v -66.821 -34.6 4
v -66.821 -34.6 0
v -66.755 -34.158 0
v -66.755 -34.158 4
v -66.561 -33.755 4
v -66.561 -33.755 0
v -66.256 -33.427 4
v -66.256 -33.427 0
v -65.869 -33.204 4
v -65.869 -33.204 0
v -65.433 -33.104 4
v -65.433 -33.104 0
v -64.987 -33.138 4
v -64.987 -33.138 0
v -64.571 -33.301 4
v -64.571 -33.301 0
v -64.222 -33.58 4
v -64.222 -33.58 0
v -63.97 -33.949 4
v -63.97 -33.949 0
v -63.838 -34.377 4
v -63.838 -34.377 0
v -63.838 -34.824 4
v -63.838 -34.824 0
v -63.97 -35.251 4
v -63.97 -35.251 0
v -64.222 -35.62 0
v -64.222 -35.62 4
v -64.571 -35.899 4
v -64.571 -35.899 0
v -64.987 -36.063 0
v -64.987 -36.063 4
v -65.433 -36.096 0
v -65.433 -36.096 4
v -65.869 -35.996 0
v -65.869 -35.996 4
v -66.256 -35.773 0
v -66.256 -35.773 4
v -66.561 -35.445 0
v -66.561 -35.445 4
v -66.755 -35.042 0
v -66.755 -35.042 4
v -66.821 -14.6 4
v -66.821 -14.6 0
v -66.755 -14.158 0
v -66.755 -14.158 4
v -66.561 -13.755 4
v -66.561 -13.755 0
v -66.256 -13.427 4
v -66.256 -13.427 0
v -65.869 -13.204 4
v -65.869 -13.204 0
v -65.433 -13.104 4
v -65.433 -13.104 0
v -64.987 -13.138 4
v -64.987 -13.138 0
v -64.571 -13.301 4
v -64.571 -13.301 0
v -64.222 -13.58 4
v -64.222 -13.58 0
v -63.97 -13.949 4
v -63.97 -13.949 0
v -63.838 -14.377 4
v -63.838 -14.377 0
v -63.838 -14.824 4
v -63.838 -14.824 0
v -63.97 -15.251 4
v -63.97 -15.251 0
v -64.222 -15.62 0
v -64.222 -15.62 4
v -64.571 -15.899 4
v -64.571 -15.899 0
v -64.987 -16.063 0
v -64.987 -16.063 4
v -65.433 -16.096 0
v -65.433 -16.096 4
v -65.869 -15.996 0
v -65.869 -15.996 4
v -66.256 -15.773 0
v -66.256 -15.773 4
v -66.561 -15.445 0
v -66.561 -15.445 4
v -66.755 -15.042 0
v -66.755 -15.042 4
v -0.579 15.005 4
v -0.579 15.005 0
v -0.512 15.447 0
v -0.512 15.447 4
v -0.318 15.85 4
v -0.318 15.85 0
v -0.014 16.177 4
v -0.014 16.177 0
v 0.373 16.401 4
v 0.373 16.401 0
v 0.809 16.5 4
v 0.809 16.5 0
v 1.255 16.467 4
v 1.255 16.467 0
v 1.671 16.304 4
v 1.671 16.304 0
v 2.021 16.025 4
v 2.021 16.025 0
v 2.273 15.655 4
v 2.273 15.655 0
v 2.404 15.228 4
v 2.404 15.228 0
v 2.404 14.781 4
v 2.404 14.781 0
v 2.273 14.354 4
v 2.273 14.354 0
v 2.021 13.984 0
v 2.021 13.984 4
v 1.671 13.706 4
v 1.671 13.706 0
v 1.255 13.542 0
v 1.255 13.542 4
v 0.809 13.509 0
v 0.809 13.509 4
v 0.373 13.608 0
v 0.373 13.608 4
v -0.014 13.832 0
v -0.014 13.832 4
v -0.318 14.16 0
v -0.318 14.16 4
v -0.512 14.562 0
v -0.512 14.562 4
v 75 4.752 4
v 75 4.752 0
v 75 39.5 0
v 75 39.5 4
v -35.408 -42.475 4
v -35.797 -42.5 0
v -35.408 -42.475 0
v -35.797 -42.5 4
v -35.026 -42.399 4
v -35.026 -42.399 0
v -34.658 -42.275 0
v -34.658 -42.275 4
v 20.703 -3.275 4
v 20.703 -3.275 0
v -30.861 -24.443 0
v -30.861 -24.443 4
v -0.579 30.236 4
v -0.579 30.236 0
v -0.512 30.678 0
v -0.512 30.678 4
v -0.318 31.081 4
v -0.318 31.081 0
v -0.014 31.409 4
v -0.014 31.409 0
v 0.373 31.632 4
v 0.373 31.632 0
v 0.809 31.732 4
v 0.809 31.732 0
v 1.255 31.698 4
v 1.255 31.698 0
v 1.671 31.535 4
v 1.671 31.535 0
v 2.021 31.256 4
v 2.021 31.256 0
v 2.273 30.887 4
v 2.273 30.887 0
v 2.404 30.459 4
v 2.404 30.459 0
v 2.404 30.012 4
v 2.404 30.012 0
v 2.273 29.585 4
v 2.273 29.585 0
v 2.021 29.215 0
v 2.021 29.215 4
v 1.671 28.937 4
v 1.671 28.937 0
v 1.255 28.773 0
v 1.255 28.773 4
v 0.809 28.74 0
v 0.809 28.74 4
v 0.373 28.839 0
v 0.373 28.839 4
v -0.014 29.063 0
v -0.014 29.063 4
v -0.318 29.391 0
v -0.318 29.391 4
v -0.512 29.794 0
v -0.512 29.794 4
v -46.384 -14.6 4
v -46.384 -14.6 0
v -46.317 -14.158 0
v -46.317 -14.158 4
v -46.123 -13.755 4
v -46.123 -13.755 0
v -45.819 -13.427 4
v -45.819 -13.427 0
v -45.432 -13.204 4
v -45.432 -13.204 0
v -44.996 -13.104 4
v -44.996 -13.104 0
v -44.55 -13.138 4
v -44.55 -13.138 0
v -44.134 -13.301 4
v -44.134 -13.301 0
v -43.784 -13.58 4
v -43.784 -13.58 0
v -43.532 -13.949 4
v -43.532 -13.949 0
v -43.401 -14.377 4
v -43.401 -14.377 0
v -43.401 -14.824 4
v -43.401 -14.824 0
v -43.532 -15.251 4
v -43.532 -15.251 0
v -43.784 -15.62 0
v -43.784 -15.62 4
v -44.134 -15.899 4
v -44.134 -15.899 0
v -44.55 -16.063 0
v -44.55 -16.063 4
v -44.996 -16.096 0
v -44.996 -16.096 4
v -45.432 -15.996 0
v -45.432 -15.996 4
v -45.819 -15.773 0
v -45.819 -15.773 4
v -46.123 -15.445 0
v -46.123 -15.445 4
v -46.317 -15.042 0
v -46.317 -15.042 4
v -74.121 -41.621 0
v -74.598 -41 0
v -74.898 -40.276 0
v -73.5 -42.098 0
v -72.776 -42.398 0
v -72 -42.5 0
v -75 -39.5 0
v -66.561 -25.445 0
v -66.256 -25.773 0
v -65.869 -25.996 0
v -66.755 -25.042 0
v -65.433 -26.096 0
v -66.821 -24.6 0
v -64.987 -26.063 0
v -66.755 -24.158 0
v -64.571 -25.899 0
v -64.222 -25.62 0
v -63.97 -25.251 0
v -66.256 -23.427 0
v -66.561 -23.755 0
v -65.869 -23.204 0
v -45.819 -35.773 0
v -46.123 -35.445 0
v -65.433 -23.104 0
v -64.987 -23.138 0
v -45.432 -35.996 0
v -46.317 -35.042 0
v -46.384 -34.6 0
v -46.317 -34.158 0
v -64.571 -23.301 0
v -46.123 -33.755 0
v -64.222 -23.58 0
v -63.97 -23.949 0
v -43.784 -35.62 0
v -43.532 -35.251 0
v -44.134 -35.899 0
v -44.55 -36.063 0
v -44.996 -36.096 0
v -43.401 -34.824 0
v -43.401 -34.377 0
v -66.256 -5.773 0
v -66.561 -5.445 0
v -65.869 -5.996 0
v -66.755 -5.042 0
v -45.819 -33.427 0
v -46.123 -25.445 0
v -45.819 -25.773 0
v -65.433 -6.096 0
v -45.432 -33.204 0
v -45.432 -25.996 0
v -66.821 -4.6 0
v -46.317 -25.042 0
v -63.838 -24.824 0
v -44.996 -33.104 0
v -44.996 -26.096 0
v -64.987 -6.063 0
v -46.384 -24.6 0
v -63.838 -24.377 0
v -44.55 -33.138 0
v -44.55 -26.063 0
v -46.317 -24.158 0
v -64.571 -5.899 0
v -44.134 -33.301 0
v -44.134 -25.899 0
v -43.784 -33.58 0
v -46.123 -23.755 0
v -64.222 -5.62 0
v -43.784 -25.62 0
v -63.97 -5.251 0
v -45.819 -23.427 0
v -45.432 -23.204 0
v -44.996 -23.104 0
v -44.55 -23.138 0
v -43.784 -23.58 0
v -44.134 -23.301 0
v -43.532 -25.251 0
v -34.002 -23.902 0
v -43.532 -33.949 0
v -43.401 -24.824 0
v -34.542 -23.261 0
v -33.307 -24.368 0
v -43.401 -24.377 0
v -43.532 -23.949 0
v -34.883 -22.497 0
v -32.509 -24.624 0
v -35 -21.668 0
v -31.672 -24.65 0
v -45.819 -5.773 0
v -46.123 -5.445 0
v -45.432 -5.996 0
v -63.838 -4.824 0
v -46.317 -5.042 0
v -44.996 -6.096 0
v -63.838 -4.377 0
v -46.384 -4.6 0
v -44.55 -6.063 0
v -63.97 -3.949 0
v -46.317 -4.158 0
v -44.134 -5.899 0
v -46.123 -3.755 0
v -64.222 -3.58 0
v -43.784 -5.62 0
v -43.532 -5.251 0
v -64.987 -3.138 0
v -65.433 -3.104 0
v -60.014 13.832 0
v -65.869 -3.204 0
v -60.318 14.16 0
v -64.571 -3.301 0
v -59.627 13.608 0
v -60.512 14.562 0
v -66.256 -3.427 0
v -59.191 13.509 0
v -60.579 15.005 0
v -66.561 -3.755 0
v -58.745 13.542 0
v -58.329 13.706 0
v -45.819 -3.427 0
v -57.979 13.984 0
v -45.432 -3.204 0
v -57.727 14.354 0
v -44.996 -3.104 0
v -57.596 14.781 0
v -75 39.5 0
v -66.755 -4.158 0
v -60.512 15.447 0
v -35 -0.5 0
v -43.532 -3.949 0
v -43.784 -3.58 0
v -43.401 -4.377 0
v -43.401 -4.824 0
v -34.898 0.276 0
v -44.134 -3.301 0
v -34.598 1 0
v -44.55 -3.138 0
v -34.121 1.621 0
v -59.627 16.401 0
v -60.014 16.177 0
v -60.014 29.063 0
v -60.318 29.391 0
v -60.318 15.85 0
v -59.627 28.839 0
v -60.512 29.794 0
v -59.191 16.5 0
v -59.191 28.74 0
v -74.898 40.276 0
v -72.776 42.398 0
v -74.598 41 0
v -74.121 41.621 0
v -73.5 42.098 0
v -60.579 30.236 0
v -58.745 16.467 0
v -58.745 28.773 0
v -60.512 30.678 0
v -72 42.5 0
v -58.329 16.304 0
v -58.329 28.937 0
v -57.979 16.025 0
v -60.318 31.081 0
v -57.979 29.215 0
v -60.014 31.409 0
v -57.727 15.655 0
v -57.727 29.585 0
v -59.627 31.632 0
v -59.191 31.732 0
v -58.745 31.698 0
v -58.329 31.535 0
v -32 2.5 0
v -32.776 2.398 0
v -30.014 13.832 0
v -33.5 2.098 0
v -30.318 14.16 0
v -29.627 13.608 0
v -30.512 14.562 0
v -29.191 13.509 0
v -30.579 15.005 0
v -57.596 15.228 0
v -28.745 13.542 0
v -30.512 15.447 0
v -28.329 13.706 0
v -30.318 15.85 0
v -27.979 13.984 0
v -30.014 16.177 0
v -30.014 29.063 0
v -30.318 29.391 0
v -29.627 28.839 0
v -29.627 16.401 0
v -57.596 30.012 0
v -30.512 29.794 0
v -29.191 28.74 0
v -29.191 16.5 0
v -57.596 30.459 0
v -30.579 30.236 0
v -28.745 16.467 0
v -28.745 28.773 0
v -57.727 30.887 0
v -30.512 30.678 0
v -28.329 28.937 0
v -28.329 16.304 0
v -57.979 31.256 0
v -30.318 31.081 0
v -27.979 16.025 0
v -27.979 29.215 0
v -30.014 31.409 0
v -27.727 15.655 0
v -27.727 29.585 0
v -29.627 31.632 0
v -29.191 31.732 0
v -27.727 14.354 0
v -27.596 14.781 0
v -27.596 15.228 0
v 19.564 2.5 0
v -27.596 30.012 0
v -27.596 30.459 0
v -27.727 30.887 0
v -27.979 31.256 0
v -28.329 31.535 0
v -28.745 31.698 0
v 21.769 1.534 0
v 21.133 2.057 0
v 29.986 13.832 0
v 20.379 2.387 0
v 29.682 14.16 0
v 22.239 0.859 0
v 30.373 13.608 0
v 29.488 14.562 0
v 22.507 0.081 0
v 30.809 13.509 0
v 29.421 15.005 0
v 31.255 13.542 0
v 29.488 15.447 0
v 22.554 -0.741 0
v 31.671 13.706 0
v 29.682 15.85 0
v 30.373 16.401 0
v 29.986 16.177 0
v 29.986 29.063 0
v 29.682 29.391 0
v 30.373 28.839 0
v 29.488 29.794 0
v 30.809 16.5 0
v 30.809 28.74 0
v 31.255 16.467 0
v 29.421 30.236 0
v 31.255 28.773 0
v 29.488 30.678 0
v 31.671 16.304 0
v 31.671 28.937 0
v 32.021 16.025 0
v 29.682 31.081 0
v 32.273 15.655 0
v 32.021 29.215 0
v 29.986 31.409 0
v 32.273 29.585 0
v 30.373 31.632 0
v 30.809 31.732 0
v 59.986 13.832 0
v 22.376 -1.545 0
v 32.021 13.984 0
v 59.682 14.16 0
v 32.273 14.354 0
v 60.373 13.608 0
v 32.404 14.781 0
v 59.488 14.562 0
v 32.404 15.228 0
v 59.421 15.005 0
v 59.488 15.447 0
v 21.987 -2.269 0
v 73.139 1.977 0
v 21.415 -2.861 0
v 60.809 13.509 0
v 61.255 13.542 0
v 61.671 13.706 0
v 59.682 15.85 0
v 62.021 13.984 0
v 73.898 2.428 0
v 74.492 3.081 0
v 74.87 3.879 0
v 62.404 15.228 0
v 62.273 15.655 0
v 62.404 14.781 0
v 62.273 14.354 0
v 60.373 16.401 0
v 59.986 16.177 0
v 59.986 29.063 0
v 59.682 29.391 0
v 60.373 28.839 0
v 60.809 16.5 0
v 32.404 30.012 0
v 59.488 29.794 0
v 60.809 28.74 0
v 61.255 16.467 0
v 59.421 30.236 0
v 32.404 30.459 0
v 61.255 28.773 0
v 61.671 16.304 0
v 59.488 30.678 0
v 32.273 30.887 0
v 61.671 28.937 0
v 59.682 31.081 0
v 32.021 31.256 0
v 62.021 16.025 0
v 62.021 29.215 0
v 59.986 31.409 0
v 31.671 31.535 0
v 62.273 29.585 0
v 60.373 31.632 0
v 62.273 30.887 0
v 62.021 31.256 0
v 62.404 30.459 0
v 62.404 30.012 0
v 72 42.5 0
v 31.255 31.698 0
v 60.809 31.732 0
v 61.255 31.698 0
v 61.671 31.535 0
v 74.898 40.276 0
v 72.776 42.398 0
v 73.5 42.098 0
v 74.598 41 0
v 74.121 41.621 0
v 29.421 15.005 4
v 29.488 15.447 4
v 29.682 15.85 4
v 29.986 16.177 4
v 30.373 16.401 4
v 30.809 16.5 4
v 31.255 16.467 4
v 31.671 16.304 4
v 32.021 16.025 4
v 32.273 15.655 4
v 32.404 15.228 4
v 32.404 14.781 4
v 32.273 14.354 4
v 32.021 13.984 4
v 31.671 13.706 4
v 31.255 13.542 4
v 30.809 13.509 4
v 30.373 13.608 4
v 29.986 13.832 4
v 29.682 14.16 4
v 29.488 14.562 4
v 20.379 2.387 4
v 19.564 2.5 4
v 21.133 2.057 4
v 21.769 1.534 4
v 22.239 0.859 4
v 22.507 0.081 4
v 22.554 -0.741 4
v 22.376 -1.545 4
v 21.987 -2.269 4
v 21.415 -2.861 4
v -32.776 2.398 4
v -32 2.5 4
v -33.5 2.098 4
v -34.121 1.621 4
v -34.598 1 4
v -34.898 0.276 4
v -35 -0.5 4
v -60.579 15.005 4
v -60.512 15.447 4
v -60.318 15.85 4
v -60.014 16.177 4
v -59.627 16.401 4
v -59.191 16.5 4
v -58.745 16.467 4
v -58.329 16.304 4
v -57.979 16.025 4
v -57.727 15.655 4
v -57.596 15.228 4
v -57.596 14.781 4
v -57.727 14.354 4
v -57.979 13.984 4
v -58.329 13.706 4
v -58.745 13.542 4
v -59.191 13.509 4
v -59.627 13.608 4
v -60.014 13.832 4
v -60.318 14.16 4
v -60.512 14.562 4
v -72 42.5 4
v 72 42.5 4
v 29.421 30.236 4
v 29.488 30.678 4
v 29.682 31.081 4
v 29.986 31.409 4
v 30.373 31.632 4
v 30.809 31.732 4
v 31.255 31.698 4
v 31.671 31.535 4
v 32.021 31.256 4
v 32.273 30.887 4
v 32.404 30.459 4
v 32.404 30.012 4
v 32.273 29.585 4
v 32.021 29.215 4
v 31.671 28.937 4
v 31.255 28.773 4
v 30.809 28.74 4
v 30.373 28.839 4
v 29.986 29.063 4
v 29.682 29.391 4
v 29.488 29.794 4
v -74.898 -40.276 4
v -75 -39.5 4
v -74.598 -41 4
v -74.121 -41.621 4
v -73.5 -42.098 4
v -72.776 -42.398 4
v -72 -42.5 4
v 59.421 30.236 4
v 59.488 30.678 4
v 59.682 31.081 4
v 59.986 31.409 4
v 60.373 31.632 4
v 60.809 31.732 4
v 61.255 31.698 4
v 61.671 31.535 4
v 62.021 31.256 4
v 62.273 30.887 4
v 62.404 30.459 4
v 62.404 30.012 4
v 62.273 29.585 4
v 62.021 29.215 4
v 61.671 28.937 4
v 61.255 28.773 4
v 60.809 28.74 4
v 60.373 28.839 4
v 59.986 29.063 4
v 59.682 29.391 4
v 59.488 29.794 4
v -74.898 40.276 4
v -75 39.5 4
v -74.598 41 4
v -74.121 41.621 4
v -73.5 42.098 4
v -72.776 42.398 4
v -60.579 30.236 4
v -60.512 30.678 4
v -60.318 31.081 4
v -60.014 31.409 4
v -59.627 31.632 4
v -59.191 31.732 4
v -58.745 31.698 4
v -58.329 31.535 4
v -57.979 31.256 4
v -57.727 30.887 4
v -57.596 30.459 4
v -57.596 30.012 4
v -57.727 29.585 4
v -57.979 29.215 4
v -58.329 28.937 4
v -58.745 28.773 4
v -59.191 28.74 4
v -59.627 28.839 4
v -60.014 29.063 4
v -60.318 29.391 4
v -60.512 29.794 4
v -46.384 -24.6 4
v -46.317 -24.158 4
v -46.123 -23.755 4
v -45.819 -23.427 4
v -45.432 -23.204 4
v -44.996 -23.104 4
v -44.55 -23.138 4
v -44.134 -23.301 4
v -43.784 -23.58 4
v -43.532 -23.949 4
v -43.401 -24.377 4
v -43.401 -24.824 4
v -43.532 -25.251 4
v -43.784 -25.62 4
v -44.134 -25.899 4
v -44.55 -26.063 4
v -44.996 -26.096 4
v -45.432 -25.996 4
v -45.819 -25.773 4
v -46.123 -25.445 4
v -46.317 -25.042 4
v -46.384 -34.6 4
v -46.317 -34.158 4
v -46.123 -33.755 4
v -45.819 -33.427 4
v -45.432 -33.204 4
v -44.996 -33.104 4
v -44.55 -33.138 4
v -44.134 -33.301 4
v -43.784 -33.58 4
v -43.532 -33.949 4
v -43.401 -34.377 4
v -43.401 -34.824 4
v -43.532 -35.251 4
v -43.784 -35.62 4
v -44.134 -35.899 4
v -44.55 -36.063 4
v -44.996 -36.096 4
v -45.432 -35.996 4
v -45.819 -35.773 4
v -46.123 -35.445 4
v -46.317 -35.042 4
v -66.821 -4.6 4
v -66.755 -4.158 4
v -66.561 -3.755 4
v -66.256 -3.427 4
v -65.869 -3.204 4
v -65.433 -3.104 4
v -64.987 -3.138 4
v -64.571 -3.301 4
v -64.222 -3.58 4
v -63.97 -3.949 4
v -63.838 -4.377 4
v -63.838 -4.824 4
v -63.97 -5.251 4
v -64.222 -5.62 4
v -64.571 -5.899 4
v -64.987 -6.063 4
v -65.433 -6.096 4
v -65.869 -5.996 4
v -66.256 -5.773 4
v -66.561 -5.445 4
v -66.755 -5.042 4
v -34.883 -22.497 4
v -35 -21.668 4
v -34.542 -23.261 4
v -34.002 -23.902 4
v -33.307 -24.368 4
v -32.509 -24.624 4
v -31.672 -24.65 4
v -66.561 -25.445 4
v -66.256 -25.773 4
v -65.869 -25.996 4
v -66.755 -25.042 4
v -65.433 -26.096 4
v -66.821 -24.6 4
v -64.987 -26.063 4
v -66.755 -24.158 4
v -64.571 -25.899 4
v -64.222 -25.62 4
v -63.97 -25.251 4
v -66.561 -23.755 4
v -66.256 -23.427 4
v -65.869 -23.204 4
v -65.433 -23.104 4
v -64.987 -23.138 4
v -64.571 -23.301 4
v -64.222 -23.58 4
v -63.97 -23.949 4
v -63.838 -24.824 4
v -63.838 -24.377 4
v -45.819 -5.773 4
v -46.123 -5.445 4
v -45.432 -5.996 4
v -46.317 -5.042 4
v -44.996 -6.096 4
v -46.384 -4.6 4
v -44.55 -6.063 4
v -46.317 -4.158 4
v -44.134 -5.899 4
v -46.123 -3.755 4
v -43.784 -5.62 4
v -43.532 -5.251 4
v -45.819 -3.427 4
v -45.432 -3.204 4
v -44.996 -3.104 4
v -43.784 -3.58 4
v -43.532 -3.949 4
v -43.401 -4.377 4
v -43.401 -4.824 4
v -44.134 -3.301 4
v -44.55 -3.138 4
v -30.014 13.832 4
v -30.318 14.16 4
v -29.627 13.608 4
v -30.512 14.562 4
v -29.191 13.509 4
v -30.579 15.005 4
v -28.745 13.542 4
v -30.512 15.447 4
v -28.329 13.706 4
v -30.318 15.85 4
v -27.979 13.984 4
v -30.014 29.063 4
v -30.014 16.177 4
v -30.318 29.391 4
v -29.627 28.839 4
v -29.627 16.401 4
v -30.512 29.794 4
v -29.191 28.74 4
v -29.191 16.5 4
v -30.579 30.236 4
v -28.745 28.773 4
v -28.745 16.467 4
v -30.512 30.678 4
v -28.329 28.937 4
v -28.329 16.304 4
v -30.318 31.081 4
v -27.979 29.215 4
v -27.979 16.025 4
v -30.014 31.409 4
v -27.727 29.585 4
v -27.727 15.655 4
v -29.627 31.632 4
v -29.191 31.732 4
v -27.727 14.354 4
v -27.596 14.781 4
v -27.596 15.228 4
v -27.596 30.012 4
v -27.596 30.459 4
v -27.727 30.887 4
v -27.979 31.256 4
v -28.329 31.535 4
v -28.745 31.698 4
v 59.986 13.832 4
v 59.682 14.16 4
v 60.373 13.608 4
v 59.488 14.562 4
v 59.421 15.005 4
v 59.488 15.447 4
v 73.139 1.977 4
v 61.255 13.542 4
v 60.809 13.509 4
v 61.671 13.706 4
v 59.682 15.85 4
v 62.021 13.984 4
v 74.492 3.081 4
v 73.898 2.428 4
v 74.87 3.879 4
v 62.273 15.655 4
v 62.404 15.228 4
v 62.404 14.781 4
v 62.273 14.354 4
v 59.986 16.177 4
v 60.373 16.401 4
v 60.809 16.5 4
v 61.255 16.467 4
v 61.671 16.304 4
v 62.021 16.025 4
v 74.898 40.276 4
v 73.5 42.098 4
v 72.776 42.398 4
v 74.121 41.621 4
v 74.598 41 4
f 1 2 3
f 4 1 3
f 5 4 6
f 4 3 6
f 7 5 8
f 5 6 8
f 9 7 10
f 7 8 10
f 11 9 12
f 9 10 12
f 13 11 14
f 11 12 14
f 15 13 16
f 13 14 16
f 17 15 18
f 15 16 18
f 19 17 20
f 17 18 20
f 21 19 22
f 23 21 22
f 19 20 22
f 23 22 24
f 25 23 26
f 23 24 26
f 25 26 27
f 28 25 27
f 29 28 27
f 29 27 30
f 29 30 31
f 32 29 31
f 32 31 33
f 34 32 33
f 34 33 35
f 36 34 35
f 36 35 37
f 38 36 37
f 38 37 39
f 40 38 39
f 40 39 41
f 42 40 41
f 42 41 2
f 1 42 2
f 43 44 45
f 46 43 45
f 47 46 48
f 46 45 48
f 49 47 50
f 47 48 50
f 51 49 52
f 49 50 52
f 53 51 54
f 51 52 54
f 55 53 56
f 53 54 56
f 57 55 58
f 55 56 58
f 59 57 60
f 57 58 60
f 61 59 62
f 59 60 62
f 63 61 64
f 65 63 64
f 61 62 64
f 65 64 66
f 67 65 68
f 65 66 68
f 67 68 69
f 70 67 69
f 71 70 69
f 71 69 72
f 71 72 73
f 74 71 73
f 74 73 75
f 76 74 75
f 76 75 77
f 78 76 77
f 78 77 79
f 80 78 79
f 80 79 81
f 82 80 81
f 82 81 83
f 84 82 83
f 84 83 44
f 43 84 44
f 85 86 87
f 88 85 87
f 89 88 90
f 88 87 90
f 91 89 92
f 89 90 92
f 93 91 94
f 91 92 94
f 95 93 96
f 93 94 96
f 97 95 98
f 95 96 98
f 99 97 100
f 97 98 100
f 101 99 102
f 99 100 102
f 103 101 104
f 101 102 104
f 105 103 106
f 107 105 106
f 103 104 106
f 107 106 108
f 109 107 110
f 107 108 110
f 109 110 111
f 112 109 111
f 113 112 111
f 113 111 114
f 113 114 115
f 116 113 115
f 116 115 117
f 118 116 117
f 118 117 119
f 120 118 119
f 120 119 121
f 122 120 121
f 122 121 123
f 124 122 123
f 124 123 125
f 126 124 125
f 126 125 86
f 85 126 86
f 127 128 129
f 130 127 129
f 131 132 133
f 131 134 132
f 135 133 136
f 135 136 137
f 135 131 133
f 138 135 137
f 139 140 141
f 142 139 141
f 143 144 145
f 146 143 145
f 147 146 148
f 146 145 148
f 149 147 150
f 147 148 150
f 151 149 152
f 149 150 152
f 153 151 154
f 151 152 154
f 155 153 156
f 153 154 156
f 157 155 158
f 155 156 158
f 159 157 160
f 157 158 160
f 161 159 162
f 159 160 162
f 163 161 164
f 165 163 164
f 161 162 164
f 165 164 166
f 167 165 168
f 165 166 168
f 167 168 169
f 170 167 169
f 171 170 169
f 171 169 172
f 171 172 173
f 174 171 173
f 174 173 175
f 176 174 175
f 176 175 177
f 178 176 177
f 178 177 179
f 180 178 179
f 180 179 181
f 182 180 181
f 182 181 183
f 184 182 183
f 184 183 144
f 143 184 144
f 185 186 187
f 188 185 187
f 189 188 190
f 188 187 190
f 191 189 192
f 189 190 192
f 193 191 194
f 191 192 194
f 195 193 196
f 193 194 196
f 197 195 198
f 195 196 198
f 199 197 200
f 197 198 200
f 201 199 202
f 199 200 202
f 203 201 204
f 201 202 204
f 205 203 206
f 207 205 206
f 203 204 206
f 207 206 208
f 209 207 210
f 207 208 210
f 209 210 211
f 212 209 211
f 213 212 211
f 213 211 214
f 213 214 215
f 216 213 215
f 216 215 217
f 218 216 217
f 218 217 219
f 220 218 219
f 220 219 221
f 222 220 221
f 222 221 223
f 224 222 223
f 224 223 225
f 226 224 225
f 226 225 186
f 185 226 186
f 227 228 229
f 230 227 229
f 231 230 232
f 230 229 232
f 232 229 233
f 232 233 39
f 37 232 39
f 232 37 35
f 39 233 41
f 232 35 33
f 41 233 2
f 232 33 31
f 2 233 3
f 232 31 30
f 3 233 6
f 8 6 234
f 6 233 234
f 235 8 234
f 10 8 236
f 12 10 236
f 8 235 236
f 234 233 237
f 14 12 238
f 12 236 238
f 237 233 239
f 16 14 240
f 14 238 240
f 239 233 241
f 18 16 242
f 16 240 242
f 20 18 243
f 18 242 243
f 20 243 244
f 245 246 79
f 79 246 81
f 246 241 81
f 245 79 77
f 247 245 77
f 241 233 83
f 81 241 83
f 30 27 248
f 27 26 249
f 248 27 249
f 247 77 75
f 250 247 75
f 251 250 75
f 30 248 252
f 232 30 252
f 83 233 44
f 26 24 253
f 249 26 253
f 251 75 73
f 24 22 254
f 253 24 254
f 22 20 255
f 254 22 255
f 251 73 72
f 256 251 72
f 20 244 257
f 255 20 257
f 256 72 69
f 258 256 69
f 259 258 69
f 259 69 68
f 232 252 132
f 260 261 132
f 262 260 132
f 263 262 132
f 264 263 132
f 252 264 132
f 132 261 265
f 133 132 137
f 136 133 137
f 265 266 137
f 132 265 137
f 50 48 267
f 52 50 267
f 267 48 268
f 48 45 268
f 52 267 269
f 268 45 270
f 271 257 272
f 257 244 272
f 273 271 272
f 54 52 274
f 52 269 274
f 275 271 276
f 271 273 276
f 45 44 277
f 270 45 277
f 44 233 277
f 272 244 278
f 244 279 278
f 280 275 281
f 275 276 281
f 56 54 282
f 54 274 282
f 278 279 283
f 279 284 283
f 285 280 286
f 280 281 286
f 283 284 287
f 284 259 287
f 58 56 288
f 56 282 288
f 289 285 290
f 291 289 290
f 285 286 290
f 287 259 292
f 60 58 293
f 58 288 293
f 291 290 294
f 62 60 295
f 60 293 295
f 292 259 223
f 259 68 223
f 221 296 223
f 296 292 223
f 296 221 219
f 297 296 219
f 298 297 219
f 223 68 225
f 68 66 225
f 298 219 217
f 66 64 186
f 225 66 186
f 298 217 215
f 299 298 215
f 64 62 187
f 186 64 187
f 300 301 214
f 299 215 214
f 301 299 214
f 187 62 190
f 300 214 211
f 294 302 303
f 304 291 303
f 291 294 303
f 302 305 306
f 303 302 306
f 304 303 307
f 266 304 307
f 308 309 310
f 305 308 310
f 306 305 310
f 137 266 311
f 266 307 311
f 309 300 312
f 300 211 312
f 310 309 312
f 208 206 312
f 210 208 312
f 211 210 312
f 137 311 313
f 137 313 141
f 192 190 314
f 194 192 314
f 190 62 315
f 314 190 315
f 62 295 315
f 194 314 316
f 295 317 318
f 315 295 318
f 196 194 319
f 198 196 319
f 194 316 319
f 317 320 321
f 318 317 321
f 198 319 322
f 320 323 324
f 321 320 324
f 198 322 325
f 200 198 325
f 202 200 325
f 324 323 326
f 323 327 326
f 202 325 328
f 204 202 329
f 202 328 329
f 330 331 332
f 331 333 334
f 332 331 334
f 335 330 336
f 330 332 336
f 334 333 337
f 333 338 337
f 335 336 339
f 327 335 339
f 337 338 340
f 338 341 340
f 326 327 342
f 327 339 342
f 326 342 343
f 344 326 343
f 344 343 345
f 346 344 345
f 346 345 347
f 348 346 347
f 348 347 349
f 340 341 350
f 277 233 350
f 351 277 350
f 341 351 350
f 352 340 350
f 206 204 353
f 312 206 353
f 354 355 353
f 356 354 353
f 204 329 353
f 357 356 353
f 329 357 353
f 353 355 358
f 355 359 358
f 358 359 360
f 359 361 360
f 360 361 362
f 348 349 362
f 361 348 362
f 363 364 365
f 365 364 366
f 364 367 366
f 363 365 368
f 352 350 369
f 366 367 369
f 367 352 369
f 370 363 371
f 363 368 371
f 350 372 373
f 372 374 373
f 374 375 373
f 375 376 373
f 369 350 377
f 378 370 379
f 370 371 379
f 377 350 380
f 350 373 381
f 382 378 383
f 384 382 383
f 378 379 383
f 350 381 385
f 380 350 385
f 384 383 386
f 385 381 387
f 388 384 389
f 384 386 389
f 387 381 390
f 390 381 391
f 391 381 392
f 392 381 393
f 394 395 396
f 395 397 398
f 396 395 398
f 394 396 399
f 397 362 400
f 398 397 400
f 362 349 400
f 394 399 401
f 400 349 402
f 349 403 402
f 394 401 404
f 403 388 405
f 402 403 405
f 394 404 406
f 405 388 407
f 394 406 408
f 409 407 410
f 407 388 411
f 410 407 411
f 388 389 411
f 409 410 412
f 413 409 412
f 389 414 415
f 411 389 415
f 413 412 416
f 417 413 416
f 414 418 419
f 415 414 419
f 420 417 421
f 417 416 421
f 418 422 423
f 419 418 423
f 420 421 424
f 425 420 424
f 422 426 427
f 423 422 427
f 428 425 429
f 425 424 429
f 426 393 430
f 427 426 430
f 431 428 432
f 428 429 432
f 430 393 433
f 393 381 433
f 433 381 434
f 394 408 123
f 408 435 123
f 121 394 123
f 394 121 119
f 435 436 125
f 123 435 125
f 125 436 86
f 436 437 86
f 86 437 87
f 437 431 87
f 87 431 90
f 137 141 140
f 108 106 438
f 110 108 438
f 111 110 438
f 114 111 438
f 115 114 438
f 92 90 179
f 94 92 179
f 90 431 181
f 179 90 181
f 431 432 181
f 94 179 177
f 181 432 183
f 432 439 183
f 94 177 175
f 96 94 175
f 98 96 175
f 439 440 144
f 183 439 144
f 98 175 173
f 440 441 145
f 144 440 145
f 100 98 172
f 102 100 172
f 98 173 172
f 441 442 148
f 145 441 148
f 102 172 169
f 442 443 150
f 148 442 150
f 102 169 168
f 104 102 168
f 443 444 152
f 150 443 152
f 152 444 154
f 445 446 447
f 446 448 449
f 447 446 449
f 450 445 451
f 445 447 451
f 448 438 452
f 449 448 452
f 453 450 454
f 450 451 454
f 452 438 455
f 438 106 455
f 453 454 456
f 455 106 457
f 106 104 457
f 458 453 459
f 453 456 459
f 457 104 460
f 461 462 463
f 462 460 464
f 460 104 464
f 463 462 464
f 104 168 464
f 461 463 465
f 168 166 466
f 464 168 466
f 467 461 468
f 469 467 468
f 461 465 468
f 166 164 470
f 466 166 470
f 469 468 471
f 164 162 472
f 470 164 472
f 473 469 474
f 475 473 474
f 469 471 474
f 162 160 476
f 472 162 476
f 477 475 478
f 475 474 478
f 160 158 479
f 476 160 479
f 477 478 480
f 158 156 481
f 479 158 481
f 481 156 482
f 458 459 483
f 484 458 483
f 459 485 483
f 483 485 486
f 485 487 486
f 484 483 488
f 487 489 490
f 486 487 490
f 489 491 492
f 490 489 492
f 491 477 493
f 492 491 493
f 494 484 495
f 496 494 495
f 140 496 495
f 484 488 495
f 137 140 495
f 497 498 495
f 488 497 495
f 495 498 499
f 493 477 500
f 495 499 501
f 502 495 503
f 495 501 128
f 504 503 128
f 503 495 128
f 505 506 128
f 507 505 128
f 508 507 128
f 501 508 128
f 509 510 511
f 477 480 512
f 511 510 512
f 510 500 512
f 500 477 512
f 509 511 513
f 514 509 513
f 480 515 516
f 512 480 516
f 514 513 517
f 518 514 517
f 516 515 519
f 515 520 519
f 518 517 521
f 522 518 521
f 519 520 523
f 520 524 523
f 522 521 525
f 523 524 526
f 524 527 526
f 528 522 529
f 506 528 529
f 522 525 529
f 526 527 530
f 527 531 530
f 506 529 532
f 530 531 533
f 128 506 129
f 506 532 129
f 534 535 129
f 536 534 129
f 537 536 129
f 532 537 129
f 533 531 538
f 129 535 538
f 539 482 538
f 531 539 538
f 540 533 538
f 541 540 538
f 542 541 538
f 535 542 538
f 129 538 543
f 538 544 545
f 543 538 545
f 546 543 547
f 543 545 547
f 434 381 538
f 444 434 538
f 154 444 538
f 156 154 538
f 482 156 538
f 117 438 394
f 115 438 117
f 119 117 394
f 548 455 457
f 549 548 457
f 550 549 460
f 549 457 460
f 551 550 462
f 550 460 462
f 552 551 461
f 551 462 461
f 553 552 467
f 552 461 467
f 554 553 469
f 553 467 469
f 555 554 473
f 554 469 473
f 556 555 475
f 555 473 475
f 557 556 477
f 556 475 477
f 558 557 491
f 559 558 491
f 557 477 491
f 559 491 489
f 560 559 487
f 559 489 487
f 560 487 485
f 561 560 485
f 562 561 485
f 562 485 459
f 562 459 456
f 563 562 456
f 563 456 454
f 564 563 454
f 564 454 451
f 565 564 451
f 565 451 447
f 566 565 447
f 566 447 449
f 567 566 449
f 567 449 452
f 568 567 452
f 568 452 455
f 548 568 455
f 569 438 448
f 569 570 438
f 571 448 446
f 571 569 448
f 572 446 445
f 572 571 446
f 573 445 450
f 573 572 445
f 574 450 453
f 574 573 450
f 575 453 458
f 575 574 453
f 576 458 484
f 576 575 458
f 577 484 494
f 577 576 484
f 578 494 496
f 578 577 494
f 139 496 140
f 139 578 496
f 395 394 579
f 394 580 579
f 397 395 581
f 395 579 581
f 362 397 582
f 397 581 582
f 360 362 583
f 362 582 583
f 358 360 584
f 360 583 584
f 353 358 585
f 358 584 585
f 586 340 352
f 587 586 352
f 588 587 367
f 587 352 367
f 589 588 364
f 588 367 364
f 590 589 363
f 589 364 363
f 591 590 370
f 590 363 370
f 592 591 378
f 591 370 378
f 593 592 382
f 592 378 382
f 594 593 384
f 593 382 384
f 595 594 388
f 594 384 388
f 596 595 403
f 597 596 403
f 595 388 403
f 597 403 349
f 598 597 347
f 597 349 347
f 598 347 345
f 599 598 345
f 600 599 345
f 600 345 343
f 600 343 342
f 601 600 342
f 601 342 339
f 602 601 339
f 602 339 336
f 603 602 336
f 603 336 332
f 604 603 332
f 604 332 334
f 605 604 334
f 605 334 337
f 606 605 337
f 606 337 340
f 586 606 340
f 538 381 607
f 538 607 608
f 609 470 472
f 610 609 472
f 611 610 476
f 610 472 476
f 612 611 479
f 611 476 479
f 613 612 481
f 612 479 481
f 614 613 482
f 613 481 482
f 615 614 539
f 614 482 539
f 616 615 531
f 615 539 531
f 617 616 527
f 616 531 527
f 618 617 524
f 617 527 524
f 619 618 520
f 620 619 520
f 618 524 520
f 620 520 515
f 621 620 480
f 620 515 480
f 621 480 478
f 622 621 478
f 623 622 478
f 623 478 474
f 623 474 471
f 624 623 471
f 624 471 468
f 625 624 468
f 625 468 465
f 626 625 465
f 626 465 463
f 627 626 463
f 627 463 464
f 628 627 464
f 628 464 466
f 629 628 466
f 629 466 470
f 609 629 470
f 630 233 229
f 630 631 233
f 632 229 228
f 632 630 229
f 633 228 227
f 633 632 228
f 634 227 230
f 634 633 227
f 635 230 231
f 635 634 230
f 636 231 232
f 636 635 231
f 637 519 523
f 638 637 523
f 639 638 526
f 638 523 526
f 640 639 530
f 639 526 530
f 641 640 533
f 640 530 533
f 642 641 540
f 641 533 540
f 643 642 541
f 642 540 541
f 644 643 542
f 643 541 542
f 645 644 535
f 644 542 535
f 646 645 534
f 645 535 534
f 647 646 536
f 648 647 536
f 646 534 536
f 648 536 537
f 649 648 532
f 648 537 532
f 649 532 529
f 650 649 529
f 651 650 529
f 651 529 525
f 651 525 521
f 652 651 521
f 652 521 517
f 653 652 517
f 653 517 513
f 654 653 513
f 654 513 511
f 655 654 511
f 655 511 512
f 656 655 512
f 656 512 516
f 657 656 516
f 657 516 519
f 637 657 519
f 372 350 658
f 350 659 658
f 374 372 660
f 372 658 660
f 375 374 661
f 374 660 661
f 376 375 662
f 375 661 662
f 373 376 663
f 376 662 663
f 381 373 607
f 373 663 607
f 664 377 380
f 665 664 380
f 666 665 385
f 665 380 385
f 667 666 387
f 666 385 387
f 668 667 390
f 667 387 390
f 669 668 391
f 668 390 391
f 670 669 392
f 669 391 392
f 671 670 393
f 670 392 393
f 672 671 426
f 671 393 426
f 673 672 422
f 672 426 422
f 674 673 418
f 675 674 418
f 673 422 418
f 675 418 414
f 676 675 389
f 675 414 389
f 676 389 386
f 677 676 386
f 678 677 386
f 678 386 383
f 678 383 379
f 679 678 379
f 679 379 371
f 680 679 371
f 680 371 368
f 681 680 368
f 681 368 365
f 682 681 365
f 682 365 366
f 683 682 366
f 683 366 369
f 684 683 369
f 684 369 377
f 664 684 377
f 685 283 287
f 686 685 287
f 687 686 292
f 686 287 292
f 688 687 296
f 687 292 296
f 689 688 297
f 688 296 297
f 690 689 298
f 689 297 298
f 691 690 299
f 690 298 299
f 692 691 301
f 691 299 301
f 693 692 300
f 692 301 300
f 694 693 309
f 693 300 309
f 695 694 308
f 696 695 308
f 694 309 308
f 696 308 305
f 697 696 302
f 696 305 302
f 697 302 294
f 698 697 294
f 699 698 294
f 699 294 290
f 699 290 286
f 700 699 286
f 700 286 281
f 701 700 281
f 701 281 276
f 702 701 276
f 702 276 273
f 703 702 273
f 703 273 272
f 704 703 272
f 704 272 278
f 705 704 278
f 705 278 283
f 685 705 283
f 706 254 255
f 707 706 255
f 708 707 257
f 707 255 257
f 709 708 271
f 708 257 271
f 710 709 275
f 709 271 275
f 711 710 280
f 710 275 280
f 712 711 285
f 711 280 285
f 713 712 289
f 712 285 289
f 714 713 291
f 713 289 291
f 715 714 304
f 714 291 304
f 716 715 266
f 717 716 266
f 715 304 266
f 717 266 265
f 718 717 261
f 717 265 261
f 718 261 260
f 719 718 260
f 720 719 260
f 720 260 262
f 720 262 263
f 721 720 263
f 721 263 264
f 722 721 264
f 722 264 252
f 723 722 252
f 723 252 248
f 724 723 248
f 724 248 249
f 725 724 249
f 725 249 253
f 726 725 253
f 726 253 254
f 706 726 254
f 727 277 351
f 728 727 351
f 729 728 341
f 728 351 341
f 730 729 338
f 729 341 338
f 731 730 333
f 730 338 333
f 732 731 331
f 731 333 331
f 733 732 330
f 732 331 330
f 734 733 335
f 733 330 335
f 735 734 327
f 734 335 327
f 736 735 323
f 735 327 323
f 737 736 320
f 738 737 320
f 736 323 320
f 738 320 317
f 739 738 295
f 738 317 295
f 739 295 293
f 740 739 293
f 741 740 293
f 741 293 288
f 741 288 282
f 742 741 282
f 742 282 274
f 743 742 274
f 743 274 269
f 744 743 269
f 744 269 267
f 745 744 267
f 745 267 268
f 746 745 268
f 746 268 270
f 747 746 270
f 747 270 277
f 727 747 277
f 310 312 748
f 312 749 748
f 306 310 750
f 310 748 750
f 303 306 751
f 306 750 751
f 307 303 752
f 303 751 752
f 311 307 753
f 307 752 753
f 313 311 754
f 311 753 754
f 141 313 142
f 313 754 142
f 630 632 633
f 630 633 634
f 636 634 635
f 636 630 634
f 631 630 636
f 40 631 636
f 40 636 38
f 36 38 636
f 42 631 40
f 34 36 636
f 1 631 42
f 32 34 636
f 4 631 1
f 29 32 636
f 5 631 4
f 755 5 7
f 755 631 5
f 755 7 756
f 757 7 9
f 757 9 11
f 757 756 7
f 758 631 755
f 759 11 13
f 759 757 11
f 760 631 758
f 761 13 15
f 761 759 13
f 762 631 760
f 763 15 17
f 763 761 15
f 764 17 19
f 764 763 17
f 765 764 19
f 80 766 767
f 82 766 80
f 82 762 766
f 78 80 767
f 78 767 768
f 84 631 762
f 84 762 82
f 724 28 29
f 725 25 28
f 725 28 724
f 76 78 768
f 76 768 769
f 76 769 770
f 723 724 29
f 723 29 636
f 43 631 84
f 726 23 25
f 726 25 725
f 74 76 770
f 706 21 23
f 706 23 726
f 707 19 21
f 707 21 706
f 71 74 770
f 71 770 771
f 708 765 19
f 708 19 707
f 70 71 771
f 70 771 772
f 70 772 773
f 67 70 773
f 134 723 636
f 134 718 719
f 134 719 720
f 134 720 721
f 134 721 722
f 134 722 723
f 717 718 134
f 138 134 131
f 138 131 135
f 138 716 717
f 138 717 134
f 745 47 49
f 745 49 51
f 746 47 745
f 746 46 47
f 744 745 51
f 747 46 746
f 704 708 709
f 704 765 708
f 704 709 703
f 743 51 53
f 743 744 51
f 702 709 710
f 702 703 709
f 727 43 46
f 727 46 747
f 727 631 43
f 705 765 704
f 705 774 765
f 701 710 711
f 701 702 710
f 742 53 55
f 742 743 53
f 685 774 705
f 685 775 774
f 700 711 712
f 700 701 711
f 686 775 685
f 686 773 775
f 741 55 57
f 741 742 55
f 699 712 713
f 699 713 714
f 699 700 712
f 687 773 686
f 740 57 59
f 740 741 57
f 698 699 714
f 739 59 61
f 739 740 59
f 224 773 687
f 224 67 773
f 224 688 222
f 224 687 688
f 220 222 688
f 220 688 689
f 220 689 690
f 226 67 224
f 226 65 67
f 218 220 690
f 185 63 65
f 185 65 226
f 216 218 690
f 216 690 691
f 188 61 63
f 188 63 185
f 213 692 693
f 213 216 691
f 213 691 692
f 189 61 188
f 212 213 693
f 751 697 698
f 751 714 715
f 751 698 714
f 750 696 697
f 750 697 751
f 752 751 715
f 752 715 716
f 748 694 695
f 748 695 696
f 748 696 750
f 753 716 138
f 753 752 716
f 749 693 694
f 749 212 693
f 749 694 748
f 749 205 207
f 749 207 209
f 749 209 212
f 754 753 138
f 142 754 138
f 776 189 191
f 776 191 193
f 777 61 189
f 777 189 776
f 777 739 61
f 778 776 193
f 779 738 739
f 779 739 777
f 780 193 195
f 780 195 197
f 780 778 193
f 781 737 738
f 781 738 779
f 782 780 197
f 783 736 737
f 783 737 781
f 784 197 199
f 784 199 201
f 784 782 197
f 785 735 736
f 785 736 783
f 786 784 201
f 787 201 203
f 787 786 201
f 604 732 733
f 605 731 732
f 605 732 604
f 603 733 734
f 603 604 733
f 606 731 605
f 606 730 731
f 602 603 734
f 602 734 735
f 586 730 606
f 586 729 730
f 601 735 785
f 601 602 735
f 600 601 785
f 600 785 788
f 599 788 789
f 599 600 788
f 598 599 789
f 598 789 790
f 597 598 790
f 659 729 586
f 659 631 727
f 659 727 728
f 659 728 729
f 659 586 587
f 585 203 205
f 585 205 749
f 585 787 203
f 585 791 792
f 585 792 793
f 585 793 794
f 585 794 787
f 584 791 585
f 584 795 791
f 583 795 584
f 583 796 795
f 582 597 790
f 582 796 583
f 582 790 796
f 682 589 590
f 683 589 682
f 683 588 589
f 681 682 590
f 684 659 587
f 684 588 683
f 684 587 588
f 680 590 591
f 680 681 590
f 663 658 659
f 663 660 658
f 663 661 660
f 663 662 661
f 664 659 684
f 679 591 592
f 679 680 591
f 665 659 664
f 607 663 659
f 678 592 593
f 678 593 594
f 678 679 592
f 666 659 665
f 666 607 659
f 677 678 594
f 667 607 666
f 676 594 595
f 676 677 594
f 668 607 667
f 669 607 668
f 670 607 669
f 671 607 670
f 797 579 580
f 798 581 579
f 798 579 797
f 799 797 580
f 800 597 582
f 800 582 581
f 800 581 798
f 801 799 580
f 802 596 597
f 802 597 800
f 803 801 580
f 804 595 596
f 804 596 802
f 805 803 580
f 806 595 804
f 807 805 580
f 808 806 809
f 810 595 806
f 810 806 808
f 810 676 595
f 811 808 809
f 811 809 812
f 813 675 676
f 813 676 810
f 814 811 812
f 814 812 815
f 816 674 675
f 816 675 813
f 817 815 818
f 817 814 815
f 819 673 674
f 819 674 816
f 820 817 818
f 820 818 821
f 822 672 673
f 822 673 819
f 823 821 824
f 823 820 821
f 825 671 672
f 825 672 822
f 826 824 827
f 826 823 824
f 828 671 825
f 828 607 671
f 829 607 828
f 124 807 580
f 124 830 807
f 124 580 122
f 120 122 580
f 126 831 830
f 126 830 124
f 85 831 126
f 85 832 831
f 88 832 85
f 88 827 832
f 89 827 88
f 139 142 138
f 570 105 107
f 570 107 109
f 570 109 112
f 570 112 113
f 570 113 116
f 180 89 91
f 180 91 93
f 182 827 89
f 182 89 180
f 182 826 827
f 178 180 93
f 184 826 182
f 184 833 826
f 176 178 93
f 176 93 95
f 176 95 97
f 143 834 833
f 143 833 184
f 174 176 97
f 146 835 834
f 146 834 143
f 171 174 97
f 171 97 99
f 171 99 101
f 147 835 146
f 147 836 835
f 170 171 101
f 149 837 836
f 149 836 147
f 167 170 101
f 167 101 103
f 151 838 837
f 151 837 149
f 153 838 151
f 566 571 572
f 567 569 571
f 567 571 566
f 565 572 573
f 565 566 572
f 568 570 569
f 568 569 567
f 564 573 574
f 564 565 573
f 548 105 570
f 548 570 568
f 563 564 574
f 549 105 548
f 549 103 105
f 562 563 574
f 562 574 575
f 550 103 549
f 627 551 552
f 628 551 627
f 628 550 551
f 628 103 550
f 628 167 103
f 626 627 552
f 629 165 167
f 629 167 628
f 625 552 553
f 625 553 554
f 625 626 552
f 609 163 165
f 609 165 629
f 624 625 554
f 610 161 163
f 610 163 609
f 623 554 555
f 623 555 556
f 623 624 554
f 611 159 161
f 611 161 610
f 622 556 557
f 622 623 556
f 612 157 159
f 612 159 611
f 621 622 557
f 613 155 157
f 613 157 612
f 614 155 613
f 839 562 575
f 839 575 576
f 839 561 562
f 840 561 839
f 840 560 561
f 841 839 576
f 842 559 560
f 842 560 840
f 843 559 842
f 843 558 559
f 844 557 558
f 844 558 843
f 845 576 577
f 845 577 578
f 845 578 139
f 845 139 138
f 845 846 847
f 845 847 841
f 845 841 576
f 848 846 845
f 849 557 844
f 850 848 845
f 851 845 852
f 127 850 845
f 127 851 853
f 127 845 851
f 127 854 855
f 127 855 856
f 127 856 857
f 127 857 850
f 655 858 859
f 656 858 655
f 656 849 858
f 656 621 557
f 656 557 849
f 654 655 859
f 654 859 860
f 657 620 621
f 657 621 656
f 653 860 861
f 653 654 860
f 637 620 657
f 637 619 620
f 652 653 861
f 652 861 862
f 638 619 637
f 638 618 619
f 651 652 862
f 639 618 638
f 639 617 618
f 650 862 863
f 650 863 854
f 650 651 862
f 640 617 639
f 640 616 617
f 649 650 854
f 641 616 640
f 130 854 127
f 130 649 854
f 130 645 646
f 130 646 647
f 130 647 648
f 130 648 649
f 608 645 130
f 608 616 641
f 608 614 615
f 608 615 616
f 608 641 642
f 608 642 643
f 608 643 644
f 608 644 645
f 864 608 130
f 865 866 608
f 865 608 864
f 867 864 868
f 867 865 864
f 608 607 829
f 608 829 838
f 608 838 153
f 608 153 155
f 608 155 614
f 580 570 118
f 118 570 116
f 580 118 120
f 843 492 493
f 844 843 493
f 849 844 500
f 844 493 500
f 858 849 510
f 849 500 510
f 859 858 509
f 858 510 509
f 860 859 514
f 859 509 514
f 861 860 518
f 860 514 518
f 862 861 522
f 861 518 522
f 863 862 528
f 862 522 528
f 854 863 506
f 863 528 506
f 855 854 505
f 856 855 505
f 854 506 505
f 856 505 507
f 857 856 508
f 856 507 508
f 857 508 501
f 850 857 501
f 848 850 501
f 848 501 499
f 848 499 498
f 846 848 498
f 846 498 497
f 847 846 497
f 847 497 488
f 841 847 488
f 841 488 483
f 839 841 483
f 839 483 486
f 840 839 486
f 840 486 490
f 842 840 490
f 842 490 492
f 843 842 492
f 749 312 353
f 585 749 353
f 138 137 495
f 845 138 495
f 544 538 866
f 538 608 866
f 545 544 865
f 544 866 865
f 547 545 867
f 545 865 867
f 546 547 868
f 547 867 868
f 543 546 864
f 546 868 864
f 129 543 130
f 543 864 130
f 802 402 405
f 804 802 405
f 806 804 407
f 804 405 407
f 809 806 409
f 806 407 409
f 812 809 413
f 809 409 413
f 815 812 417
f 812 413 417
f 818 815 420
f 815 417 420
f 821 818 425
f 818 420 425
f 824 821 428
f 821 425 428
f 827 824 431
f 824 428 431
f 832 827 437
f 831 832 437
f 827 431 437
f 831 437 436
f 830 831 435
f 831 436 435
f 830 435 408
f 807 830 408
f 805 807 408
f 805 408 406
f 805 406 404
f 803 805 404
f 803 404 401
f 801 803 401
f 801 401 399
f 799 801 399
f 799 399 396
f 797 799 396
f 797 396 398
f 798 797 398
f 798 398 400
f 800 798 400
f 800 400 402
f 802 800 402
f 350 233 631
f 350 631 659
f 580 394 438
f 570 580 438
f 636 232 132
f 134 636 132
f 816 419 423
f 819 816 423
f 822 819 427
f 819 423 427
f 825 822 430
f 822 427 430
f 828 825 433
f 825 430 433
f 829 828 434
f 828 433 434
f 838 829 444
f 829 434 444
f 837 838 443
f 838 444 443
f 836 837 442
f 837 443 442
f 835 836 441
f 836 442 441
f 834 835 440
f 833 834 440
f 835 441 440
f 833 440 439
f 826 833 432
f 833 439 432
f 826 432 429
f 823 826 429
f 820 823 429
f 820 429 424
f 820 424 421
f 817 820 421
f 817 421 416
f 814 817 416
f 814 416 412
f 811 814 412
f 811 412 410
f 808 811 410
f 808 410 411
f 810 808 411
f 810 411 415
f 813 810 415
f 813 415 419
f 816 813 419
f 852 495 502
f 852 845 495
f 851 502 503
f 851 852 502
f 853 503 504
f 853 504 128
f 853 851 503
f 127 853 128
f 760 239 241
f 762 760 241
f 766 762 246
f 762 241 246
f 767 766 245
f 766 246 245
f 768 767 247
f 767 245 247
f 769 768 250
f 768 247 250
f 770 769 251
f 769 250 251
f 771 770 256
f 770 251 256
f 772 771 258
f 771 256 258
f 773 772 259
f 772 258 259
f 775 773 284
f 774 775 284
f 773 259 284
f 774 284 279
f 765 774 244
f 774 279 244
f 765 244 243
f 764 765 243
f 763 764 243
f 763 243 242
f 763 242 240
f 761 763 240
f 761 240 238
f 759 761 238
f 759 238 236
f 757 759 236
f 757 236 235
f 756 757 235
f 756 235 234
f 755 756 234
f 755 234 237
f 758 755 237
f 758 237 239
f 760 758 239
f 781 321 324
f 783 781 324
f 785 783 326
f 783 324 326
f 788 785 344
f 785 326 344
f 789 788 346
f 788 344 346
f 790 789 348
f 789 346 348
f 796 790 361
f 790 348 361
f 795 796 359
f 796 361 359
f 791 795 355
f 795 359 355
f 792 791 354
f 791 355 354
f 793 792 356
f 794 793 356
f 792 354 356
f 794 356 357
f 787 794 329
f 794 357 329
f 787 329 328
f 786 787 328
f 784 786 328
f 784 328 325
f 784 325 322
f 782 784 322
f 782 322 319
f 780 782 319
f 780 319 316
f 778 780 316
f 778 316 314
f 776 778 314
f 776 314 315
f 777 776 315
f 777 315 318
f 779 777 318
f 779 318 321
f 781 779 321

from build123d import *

# Parameters (mm, degrees)
SKETCH_1_W          = 150
SKETCH_1_H          = 85
EXTRUDE_1_DEPTH     = 4
CUT_EXTRUDE_1_DEPTH = 10
SKETCH_3_R          = 1.5
CUT_EXTRUDE_2_DEPTH = 10
CUT_EXTRUDE_3_DEPTH = 10
FILLET_1_R          = 3


with BuildPart() as part:
    # 草图1 → 凸台-拉伸1 (new body)
    with BuildSketch(Plane.XY):
        Rectangle(SKETCH_1_W, SKETCH_1_H)
    extrude(amount=EXTRUDE_1_DEPTH)

    # 草图2 → 切除-拉伸1 (cut)
    with BuildSketch(Plane(origin=(0, 0, 0), x_dir=(-1, 0, 0), z_dir=(0, 0, -1))):
        Polygon((35.204977583, -42.5), (-75, 2.740355619), (-77.497943244, -0.131283493), (-84.390465543, -55.505754288), (-64.834396177, -59.115887647), align=None)
    extrude(amount=-CUT_EXTRUDE_1_DEPTH, mode=Mode.SUBTRACT)

    # 草图3 → 切除-拉伸2 (cut)
    with BuildSketch(Plane(origin=(0, 0, 0), x_dir=(-1, 0, 0), z_dir=(0, 0, -1))):
        with Locations((-60.921137183, 30.235756338)):
            Circle(SKETCH_3_R)
        with Locations((-30.921137183, 30.235756338)):
            Circle(SKETCH_3_R)
        with Locations((-0.921137183, 30.235756338)):
            Circle(SKETCH_3_R)
        with Locations((29.078862817, 30.235756338)):
            Circle(SKETCH_3_R)
        with Locations((59.078862817, 30.235756338)):
            Circle(SKETCH_3_R)
        with Locations((59.078862817, 15.004599281)):
            Circle(SKETCH_3_R)
        with Locations((29.078862817, 15.004599281)):
            Circle(SKETCH_3_R)
        with Locations((-0.921137183, 15.004599281)):
            Circle(SKETCH_3_R)
        with Locations((-30.921137183, 15.004599281)):
            Circle(SKETCH_3_R)
        with Locations((-60.921137183, 15.004599281)):
            Circle(SKETCH_3_R)
        with Locations((44.883757424, -4.600166374)):
            Circle(SKETCH_3_R)
        with Locations((44.883757424, -14.600166374)):
            Circle(SKETCH_3_R)
        with Locations((44.883757424, -24.600166374)):
            Circle(SKETCH_3_R)
        with Locations((44.883757424, -34.600166374)):
            Circle(SKETCH_3_R)
        with Locations((65.321220159, -34.600166374)):
            Circle(SKETCH_3_R)
        with Locations((65.321220159, -24.600166374)):
            Circle(SKETCH_3_R)
        with Locations((65.321220159, -14.600166374)):
            Circle(SKETCH_3_R)
        with Locations((65.321220159, -4.600166374)):
            Circle(SKETCH_3_R)
    extrude(amount=-CUT_EXTRUDE_2_DEPTH, mode=Mode.SUBTRACT)

    # 草图4 → 切除-拉伸3 (cut)
    with BuildSketch(Plane(origin=(0, 0, 0), x_dir=(-1, 0, 0), z_dir=(0, 0, -1))):
        Polygon((-34.771828022, 2.5), (35, -26.142102935), (35, 2.5), align=None)
    extrude(amount=-CUT_EXTRUDE_3_DEPTH, mode=Mode.SUBTRACT)

    # 圆角1
    fillet_1_edges = [part.edges().sort_by_distance(p)[0] for p in [
        (34.771828022, 2.5, 2),
        (-35, 2.5, 2),
        (-35, -26.142102935, 2),
        (75, 2.740355619, 2),
        (-35.204977583, -42.5, 2),
        (-75, -42.5, 2),
        (-75, 42.5, 2),
        (75, 42.5, 2),
    ]]
    fillet(fillet_1_edges, radius=FILLET_1_R)


solid = part.part
